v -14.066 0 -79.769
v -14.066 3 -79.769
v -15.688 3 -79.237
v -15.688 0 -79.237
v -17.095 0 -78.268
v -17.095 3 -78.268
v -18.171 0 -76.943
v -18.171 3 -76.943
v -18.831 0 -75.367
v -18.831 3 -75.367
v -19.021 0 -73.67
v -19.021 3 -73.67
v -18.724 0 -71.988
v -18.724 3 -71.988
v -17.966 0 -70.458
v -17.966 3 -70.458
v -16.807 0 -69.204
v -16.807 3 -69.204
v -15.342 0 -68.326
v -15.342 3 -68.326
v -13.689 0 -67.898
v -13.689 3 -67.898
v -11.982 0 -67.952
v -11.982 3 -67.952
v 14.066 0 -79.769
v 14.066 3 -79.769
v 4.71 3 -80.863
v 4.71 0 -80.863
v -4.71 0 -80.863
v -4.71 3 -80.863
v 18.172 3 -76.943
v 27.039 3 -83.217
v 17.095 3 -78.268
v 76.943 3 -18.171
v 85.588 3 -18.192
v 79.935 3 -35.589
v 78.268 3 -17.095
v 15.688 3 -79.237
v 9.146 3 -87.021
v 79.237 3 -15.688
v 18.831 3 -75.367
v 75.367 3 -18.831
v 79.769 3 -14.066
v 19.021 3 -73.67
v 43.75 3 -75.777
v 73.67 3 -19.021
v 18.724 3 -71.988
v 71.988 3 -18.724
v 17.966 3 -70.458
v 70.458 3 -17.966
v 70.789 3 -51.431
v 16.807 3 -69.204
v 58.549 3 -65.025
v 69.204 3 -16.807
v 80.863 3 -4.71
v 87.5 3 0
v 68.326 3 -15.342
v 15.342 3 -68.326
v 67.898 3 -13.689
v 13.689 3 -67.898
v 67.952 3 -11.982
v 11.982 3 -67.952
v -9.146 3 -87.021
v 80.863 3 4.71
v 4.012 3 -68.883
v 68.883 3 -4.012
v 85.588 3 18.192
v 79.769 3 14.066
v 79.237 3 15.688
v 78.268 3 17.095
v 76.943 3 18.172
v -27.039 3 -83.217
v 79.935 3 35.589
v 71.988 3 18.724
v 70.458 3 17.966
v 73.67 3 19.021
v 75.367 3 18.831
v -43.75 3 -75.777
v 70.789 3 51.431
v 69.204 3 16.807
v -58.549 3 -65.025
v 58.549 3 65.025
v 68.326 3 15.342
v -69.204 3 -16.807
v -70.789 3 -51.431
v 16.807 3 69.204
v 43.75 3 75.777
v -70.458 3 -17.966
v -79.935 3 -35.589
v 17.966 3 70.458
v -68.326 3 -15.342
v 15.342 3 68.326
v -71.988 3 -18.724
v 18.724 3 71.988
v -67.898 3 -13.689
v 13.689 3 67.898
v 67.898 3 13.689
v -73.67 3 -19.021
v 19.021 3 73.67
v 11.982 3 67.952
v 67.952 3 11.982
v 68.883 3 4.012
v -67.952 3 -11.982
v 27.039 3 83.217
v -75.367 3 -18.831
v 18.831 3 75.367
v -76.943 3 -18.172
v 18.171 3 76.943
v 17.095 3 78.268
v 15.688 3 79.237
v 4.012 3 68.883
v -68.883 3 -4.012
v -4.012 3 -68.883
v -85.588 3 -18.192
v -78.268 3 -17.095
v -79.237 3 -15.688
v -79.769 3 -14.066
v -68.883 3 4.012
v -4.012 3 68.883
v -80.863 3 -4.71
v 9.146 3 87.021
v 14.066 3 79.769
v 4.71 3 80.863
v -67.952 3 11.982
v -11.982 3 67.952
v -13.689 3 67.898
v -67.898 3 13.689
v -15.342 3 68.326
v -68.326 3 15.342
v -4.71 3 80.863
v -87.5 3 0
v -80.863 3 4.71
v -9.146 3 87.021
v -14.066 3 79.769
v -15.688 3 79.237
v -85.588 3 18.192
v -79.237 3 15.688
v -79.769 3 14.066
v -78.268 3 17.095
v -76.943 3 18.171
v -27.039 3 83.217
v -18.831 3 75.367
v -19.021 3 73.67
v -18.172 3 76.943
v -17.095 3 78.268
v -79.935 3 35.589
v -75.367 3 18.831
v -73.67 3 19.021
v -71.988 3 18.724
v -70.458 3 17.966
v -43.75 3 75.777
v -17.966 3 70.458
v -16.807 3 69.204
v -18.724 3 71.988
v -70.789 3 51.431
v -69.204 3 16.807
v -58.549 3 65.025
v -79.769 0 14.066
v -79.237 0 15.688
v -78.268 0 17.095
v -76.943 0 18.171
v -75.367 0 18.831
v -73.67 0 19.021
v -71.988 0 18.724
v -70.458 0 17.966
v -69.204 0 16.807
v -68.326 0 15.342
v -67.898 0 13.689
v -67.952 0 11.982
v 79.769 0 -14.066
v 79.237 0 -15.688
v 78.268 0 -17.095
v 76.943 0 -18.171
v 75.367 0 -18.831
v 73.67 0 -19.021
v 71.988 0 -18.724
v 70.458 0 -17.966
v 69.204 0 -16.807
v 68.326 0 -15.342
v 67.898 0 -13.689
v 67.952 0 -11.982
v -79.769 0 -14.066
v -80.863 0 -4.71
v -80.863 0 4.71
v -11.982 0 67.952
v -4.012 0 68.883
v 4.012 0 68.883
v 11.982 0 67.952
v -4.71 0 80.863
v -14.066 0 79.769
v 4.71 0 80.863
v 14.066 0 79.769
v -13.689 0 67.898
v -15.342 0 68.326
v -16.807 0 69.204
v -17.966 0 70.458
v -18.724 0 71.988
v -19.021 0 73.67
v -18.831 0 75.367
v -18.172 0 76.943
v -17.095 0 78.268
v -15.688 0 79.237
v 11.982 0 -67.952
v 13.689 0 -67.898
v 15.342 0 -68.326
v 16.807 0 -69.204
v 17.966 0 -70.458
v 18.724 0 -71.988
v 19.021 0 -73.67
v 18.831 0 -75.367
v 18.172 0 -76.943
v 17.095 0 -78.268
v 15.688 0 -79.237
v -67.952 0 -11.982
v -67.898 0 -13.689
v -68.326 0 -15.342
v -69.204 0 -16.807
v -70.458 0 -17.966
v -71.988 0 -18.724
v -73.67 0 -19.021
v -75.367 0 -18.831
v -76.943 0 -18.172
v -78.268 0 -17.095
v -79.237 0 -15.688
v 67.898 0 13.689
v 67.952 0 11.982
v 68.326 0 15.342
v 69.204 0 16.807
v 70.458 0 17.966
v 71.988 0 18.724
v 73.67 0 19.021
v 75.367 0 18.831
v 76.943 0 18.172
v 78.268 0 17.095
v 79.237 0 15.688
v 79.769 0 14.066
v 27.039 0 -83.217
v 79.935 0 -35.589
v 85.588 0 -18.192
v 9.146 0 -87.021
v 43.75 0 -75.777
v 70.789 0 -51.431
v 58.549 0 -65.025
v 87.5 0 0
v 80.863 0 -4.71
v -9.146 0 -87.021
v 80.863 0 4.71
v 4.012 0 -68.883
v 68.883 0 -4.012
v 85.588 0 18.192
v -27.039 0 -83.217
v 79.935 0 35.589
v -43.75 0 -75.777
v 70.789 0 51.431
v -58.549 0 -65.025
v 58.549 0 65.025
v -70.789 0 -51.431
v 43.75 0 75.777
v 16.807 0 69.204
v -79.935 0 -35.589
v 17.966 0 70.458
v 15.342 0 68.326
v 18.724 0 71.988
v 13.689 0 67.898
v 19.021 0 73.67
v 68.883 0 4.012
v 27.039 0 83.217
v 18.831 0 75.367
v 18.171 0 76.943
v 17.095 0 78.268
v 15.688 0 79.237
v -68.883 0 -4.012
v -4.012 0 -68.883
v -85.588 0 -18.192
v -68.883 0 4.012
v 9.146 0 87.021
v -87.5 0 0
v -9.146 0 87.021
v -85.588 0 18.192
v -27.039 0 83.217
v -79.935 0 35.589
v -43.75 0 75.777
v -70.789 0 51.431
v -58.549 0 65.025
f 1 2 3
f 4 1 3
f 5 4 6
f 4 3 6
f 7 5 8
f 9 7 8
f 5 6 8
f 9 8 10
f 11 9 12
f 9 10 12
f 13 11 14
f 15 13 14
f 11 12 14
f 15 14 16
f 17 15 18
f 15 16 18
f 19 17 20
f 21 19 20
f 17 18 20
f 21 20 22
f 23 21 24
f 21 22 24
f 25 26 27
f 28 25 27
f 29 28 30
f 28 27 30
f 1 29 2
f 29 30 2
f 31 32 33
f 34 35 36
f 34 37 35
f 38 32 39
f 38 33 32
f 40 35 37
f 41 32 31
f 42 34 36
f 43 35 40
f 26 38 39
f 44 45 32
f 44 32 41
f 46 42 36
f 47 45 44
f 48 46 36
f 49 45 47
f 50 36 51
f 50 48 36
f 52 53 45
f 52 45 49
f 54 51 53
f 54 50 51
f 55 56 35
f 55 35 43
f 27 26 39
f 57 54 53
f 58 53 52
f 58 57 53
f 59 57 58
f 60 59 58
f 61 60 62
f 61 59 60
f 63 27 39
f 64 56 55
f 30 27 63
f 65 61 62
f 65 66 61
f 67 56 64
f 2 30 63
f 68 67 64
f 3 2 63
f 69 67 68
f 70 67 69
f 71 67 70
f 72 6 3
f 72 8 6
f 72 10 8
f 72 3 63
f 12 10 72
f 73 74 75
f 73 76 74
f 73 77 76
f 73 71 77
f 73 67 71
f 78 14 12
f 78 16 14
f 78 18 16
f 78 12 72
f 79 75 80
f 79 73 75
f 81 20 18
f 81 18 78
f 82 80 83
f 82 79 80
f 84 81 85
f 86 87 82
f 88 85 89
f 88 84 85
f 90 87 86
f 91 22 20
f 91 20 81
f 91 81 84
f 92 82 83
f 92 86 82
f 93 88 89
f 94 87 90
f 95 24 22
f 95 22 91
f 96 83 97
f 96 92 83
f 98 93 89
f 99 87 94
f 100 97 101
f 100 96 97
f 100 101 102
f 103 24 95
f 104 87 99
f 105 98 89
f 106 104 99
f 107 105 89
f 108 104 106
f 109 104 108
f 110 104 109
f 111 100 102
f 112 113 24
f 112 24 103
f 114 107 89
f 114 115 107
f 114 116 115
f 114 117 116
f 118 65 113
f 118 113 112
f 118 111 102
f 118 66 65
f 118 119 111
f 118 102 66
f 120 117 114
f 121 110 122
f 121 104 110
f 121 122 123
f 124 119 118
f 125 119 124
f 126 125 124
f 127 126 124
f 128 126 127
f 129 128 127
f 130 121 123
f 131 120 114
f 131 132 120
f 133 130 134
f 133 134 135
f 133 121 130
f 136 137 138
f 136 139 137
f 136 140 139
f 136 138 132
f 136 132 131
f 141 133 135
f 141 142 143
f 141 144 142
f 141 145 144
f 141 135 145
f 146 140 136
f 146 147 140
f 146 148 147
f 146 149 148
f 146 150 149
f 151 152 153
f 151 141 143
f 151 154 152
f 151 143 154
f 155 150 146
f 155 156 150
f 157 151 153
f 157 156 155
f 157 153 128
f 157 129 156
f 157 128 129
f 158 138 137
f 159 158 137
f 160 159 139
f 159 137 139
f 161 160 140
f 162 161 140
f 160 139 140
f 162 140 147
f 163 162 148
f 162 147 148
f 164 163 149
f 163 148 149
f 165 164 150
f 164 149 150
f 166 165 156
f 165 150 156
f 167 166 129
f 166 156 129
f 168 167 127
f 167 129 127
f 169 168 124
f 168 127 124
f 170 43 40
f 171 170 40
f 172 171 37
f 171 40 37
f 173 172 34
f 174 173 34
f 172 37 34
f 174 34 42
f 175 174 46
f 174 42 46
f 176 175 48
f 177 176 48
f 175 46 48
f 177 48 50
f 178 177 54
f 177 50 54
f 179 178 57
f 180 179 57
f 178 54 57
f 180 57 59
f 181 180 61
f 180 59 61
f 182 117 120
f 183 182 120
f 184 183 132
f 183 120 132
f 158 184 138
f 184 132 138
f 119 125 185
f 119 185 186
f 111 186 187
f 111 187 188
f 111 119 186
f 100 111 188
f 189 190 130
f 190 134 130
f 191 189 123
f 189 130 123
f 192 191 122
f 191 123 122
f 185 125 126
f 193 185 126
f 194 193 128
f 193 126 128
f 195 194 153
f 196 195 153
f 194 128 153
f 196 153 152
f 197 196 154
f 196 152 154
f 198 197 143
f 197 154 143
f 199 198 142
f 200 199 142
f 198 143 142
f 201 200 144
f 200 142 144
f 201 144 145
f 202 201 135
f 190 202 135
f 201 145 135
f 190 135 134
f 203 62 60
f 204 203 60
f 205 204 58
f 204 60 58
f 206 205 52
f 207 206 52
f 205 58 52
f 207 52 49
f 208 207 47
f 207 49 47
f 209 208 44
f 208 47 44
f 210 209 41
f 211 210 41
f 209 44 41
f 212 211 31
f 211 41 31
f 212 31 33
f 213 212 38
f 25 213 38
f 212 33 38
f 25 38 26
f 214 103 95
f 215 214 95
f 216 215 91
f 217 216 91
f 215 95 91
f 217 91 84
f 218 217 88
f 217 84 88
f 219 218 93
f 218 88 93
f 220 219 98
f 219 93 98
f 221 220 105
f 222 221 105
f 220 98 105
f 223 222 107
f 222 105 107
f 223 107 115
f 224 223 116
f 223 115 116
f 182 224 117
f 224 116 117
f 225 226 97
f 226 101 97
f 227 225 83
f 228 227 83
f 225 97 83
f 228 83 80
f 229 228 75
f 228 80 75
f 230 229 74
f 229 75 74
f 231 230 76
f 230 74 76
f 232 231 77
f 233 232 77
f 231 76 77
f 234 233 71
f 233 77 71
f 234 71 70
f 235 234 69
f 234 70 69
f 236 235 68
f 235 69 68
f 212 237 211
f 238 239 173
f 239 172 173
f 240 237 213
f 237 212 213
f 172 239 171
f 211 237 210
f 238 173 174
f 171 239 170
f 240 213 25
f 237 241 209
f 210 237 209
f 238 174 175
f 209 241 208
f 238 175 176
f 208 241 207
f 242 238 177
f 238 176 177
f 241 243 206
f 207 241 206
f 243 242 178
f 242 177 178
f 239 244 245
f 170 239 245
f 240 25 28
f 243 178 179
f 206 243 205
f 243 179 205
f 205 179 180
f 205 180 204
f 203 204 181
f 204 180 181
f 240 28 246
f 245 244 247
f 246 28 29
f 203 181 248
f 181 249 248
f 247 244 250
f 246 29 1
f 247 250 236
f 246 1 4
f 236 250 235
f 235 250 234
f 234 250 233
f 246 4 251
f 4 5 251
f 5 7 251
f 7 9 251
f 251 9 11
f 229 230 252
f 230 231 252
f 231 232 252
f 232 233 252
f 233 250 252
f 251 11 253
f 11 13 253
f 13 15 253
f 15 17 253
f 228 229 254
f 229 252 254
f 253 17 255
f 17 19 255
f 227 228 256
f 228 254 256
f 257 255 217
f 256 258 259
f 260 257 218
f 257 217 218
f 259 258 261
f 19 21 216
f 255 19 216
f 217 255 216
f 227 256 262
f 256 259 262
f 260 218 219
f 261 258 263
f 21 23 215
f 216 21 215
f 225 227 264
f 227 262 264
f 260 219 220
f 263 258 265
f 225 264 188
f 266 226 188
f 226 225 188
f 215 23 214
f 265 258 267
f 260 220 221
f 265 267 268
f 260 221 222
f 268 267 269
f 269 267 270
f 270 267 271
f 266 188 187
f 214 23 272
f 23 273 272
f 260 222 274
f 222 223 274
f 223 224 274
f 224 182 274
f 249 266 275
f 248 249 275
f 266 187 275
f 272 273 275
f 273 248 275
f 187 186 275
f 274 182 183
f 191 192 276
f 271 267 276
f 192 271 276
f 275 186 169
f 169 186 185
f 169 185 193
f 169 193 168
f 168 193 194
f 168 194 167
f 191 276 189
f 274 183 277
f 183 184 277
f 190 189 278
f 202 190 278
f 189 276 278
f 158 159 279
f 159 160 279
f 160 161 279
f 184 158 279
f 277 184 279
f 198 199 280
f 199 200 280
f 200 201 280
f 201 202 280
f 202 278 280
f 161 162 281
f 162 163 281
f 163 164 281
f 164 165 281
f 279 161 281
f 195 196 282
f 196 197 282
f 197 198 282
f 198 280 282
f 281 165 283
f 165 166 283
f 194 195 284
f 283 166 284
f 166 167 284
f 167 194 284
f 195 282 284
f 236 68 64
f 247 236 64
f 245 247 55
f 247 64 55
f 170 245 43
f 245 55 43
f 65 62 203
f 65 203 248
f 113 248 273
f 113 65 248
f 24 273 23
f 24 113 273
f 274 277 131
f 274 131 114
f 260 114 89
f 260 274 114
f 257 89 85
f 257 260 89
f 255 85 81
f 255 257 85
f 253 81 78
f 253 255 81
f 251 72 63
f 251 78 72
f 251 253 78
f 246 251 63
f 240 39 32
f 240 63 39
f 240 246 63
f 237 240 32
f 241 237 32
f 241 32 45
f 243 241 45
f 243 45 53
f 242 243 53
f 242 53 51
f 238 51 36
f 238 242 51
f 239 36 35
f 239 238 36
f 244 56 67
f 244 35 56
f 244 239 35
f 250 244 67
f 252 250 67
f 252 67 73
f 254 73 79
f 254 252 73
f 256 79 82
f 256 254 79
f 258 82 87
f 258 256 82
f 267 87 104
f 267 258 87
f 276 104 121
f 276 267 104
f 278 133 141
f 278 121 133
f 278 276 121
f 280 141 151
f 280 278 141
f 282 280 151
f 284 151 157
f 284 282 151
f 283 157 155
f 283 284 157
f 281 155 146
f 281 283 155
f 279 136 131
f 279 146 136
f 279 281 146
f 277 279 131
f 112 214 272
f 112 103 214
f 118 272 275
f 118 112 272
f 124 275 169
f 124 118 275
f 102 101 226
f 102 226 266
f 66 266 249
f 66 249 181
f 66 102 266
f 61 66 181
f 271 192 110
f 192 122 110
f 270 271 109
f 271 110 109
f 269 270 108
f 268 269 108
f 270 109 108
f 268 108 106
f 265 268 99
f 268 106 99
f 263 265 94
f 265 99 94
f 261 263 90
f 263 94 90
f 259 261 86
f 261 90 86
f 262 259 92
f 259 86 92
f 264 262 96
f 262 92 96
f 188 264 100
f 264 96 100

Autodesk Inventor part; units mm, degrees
ref_plane "YZ Plane" through (0, 0, 0) normal (1, 0, 0) x (0, 1, 0)
ref_plane "XZ Plane" through (0, 0, 0) normal (0, 1, 0) x (-1, 0, 0)
ref_plane "XY Plane" through (0, 0, 0) normal (0, 0, 1) x (1, 0, 0)
sketch "Sketch1" plane through (0, 0, 0) normal (0, 1, 0) x (-1, 0, 0)
  circle A0 centre (0, 0) radius 87.5
  dimension "d0" = 175
extrude "Plate1" add sketch "Sketch1" along normal blind 3
sketch "Sketch2" plane through (0, 3, 0) normal (0, 1, 0) x (1, 0, 0)
  circle A0 centre (0, 0) radius 87.5 projected
  arc A1 (73.8606, -13.0236) -> (73.8606, 13.0236) centre (0, 0) ccw construction
  arc A2 (79.7694, -14.0655) -> (79.7694, 14.0655) centre (0, 0) ccw
  arc A3 (67.9517, -11.9817) -> (67.9517, 11.9817) centre (0, 0) ccw
  arc A4 (67.9517, -11.9817) -> (79.7694, -14.0655) centre (73.8606, -13.0236) ccw
  arc A5 (79.7694, 14.0655) -> (67.9517, 11.9817) centre (73.8606, 13.0236) ccw
  point P0 (75, 0)
  dimension "d19" = 12
  dimension "d20" = 20
  dimension "d21" = 75
extrude "Extrusion1" cut sketch "Sketch2" against normal through all contours A4 A3 A5 A2
pattern_circular "Circular Pattern1" count 4 over 360 about axis through (0, -10, 0) along (0, 1, 0) of "Extrusion1"
equation "\"BendReliefWidth\" = Thickness"
equation "\"BendReliefDepth\" = 0.5 * Thickness"
equation "\"CornerReliefSize\" = 4 * Thickness"
equation "\"MinimumRemnant\" = 2 * Thickness"
equation "\"TransitionRadius\" = BendRadius"
equation "\"JacobiRadiusSize\" = BendRadius"
equation "\"GapSize\" = Thickness"
properties part number "MSC 906 flange frame" material "Stainless Steel"
